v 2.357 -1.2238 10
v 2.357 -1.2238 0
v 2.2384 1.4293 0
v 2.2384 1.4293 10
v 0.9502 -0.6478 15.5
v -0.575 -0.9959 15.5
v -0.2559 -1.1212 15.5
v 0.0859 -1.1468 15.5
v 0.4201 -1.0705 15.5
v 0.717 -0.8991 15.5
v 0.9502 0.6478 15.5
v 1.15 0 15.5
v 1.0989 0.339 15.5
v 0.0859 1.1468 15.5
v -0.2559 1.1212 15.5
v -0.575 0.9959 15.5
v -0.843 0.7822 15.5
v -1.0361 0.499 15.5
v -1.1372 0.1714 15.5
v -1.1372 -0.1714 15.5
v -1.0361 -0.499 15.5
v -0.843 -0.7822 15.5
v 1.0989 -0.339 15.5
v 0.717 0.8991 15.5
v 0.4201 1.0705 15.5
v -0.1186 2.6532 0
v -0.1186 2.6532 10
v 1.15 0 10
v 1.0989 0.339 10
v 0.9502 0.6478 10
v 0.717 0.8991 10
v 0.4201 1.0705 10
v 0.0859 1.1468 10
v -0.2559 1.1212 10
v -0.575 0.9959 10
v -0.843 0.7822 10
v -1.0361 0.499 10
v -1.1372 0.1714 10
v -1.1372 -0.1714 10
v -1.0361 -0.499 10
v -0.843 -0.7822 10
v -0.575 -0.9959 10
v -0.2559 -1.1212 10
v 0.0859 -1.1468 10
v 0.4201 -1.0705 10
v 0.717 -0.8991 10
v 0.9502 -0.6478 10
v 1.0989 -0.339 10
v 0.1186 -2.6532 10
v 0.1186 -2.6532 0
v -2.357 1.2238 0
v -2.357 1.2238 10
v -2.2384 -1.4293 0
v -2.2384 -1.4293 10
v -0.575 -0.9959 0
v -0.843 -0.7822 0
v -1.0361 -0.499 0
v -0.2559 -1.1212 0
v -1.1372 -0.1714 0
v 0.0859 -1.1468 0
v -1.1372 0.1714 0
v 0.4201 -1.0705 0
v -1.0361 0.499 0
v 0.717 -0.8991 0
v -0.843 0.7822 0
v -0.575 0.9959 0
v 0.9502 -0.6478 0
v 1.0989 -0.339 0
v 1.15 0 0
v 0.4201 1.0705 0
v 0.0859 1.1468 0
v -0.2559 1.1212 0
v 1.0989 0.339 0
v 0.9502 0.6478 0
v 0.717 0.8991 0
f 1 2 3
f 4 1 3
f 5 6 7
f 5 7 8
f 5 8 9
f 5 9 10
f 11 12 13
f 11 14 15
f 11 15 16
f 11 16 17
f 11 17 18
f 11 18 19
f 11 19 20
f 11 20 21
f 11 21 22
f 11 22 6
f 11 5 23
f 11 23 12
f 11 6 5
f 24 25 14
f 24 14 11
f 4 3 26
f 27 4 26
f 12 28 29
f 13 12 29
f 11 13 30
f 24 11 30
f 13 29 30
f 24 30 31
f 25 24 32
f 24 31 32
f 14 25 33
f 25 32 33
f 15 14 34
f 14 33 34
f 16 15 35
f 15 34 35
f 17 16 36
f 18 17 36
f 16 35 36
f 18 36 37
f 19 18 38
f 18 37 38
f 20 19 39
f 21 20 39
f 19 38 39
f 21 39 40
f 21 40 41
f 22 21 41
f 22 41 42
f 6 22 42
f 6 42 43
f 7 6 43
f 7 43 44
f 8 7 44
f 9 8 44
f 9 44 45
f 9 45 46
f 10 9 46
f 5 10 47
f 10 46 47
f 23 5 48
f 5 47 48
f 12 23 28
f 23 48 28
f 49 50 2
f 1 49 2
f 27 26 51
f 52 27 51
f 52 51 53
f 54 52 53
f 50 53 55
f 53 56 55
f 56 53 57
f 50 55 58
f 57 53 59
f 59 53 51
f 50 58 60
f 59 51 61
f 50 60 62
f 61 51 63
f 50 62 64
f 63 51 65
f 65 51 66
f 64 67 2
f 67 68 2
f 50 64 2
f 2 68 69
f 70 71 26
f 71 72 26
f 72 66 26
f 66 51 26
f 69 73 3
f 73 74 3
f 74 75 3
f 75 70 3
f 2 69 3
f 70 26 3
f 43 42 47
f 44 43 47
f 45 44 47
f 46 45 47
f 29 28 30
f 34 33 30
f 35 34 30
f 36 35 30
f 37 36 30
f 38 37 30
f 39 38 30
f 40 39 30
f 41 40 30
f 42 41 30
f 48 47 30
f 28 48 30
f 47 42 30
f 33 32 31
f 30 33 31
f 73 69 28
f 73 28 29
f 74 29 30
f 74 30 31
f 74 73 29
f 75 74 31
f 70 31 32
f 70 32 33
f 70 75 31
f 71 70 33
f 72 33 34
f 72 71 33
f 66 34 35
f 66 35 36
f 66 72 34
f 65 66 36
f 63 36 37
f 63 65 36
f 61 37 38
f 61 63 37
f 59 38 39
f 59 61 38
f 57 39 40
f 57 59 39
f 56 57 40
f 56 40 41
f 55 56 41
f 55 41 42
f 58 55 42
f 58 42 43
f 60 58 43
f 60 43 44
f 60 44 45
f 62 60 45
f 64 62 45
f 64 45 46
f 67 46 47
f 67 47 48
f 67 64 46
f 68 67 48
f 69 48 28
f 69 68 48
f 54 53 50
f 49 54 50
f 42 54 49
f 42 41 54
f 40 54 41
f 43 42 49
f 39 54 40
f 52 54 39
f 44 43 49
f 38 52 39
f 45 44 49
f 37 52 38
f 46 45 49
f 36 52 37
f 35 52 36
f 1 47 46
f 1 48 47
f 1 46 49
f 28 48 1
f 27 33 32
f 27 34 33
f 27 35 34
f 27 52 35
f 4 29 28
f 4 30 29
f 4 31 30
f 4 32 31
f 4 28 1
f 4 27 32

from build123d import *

# Parameters (mm, degrees)
SKETCH1_R           = 1.15
BOSS_EXTRUDE1_DEPTH = 10
SKETCH3_R           = 1.15
BOSS_EXTRUDE2_DEPTH = 5.5


with BuildPart() as part:
    # Sketch1 → Boss-Extrude1 (new body)
    with BuildSketch(Plane.XY):
        Polygon((2.357022055, -1.223838375), (2.23838615, 1.429321789), (-0.118635905, 2.653160164), (-2.357022055, 1.223838375), (-2.23838615, -1.429321789), (0.118635905, -2.653160164), align=None)
        Circle(SKETCH1_R, mode=Mode.SUBTRACT)
    extrude(amount=BOSS_EXTRUDE1_DEPTH)


with BuildPart() as body_2:
    # Sketch3 → Boss-Extrude2 (new body)
    with BuildSketch(Plane.XY.offset(10)):
        Circle(SKETCH3_R)
    extrude(amount=BOSS_EXTRUDE2_DEPTH)


solid = Compound([part.part, body_2.part])
